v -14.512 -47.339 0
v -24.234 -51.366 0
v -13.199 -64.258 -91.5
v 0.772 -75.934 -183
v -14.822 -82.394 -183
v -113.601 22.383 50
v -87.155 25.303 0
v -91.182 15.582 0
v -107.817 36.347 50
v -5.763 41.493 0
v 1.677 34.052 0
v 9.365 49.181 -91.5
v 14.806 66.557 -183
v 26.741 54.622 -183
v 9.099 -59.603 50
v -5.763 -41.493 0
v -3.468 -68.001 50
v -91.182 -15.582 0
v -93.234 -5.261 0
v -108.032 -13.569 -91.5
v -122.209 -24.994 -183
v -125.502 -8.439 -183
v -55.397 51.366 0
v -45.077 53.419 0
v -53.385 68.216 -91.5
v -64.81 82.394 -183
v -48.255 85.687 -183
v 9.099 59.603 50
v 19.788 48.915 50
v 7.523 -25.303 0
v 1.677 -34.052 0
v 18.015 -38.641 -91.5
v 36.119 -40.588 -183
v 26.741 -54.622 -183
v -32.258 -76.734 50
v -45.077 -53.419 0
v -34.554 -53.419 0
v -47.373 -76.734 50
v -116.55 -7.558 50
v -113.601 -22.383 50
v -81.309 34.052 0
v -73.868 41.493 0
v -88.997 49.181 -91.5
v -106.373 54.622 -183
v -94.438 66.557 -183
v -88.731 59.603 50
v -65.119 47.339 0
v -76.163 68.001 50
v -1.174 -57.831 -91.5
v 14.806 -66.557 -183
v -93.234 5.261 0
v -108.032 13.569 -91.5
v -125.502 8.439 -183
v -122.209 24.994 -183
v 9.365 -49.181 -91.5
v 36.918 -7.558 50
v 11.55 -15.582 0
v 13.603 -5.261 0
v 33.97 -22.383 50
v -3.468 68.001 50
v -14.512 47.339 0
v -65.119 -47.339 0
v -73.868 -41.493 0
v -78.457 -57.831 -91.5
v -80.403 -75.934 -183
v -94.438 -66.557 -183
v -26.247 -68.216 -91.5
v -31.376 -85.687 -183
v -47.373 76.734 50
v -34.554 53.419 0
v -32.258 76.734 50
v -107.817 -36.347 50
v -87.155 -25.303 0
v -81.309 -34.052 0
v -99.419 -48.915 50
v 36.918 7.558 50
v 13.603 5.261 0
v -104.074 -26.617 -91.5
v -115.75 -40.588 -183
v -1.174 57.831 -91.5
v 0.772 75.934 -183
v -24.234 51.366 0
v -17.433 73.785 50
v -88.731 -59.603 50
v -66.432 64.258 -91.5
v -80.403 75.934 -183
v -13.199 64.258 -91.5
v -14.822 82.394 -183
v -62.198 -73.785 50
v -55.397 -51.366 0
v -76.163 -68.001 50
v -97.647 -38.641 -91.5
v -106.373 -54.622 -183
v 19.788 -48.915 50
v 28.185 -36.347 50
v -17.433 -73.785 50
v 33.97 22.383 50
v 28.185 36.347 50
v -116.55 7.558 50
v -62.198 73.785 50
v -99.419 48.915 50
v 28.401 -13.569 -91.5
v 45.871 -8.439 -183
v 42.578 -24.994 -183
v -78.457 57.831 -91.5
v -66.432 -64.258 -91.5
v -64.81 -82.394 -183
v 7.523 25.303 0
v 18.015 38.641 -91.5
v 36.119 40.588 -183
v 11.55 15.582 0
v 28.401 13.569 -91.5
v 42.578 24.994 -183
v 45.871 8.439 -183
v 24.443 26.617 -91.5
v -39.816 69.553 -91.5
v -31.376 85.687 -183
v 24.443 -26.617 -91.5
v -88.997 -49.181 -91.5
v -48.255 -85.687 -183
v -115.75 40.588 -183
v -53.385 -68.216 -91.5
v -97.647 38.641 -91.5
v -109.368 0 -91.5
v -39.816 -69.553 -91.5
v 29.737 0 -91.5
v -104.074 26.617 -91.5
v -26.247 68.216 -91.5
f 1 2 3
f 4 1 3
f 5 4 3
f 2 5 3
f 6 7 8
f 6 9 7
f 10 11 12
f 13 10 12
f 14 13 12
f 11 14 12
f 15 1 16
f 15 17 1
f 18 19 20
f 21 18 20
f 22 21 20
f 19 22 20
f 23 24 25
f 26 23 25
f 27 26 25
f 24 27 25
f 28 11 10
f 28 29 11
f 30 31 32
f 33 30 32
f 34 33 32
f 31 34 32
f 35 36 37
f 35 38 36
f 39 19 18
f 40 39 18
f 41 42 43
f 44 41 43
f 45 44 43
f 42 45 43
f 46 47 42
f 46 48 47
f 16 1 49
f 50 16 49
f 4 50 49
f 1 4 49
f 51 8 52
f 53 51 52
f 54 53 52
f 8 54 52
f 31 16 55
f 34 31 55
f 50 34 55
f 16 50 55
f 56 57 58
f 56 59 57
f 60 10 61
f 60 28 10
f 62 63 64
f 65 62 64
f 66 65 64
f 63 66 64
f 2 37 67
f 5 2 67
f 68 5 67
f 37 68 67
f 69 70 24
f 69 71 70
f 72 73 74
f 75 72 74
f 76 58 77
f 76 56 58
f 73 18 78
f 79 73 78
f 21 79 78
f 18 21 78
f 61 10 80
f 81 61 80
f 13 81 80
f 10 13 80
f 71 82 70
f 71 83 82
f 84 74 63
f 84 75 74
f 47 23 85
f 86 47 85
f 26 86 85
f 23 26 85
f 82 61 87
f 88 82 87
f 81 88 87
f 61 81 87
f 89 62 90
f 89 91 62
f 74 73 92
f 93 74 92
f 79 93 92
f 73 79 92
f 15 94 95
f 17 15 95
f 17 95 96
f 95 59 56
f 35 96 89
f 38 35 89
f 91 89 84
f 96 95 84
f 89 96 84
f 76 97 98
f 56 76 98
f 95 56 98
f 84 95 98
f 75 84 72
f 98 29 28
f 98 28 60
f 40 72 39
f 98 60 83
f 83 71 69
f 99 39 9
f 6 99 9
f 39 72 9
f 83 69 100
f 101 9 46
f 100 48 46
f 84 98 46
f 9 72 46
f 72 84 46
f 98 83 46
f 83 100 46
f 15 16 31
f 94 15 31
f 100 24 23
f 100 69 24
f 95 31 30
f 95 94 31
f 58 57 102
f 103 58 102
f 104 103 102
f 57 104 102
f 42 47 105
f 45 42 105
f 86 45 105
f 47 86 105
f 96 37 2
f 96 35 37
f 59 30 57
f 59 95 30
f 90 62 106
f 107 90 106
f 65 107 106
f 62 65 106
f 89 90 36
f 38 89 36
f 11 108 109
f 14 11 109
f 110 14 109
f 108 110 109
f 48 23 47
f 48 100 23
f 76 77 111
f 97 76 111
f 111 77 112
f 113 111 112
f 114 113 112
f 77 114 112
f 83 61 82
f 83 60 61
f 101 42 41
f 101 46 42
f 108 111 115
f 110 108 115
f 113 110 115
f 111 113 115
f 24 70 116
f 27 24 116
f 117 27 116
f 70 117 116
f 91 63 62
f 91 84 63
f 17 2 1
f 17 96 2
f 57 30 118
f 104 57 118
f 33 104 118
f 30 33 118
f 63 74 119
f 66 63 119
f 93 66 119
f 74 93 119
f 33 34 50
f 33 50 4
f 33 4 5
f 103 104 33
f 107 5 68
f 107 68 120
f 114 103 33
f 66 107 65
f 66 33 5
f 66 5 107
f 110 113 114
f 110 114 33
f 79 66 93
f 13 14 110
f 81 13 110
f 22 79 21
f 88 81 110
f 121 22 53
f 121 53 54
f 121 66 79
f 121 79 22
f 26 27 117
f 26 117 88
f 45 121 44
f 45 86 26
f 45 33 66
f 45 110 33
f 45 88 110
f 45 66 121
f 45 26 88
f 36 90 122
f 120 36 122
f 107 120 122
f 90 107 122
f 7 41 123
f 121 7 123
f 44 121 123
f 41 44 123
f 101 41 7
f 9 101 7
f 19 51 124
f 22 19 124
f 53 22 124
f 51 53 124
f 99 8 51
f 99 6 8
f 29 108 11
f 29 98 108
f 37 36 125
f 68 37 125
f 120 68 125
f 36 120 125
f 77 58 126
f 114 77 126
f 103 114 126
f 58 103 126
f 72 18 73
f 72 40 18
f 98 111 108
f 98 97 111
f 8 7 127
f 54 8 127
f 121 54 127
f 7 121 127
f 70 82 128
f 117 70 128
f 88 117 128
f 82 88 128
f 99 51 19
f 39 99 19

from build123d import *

# Parameters (mm, degrees)
F1_DEPTH      = 50
F1_TAPER      = -25
F1_DEPTH_BACK = 183
F1_TAPER_BACK = -10


with BuildPart() as f1:
    # F0 (on Top) → F1 (new body, two sides)
    with BuildSketch(Plane.XY) as f1_sk:
        Polygon((13.6030390859, -5.2612845288), (13.6030390859, 5.2612845288), (11.5501877, 15.5816653725), (7.5233748557, 25.3032515542), (1.6773487125, 34.0524479689), (-5.7632312236, 41.493027905), (-14.5124276384, 47.3390540483), (-24.2340138201, 51.3658668925), (-34.5543946638, 53.4187182784), (-45.0769637213, 53.4187182784), (-55.397344565, 51.3658668925), (-65.1189307467, 47.3390540483), (-73.8681271614, 41.493027905), (-81.3087070976, 34.0524479689), (-87.1547332408, 25.3032515542), (-91.1815460851, 15.5816653725), (-93.234397471, 5.2612845288), (-93.234397471, -5.2612845288), (-91.1815460851, -15.5816653725), (-87.1547332408, -25.3032515542), (-81.3087070976, -34.0524479689), (-73.8681271614, -41.493027905), (-65.1189307467, -47.3390540483), (-55.397344565, -51.3658668925), (-45.0769637213, -53.4187182784), (-34.5543946638, -53.4187182784), (-24.2340138201, -51.3658668925), (-14.5124276384, -47.3390540483), (-5.7632312236, -41.493027905), (1.6773487125, -34.0524479689), (7.5233748557, -25.3032515542), (11.5501877, -15.5816653725), align=None)
    extrude(amount=F1_DEPTH, taper=F1_TAPER)
    extrude(f1_sk.sketch, amount=-F1_DEPTH_BACK, taper=F1_TAPER_BACK)


solid = f1.part
